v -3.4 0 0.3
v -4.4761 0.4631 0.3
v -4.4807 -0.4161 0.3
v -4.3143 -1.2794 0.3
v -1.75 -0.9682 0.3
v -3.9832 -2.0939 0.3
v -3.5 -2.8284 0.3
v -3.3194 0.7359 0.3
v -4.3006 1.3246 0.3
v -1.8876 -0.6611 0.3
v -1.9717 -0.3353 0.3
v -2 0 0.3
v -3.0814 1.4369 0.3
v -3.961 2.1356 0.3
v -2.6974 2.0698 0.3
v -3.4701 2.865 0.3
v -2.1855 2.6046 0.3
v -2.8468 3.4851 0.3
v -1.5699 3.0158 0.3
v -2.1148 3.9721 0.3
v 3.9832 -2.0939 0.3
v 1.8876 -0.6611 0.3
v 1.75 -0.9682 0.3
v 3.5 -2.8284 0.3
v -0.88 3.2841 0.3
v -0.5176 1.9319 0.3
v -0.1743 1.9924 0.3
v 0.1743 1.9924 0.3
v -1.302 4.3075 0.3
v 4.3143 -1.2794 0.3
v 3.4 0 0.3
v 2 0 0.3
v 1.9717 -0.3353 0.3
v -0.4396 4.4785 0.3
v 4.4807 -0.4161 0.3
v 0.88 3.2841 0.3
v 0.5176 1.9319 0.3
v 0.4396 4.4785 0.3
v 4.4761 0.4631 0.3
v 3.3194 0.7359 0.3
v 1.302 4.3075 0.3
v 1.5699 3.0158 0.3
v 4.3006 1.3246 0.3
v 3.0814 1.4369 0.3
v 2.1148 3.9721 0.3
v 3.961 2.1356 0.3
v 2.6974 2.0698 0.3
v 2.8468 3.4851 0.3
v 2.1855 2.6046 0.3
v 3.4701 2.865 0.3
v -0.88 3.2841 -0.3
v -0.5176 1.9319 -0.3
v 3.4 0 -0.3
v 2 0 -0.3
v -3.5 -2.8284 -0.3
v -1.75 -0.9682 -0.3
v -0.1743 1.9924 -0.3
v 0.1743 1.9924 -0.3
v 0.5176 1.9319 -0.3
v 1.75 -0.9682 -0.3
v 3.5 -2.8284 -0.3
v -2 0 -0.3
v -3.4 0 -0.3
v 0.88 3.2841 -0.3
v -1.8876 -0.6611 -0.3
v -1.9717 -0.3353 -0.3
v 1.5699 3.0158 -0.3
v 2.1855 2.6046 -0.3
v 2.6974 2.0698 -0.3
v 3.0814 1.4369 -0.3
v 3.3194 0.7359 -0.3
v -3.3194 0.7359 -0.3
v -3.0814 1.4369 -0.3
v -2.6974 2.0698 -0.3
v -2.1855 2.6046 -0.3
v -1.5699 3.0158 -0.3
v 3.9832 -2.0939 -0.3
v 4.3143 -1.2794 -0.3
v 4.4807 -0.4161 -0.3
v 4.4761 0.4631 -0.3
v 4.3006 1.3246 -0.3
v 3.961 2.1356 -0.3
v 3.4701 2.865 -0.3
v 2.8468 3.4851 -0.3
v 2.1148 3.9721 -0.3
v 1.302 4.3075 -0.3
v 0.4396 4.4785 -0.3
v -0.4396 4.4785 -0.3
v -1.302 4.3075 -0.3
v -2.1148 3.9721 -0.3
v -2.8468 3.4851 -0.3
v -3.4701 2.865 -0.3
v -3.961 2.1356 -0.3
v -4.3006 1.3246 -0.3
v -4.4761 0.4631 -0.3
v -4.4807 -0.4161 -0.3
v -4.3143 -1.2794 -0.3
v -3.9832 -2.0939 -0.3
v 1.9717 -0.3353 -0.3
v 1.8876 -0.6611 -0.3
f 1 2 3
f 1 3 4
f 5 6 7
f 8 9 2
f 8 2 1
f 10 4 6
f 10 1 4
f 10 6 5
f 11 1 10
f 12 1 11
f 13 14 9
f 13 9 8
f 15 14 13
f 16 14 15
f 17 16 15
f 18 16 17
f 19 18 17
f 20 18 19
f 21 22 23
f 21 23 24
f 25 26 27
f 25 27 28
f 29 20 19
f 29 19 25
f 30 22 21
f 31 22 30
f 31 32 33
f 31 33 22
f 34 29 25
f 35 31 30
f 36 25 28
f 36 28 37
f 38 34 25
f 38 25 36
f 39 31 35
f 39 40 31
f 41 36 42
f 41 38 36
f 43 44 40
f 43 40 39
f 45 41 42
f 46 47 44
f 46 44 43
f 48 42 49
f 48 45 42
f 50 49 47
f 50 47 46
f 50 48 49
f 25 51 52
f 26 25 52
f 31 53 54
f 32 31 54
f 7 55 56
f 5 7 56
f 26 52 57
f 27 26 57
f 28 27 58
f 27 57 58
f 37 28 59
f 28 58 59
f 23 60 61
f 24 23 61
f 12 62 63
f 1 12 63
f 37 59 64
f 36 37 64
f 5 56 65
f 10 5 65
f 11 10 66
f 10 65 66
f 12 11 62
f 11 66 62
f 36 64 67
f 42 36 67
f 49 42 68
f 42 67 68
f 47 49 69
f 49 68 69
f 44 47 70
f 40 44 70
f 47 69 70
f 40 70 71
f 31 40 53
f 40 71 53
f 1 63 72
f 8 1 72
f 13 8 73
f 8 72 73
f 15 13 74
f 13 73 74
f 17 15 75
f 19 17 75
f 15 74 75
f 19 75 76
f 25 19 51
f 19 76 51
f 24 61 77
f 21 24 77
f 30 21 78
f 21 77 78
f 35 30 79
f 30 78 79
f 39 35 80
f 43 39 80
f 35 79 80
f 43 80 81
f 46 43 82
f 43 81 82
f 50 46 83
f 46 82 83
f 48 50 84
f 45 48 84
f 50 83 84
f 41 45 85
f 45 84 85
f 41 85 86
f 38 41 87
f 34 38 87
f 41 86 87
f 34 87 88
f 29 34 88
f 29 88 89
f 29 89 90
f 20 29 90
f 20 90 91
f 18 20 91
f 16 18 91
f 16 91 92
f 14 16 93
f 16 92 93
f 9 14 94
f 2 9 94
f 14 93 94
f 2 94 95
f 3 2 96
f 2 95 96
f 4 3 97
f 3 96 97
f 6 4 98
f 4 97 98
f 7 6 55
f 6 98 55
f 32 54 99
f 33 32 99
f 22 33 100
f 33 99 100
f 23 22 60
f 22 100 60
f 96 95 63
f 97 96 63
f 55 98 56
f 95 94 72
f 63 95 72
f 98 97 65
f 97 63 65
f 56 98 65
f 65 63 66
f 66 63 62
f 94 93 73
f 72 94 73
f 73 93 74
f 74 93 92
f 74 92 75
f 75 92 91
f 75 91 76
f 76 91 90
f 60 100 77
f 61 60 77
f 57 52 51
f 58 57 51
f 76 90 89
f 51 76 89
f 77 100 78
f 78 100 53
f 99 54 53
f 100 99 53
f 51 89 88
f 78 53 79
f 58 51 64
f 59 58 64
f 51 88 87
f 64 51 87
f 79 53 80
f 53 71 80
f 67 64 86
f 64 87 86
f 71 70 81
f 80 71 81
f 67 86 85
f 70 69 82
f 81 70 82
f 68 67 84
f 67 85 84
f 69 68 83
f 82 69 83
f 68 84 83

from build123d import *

# Parameters (mm, degrees)
EXTRUDE_1_DEPTH      = 0.3
EXTRUDE_1_DEPTH_BACK = 0.3


with BuildPart() as part:
    # 草圖1 → 填料-伸長1 (new, two sides: drawn at the far end of the back side and taken through both)
    with BuildSketch(Plane.XY.offset(-EXTRUDE_1_DEPTH_BACK)):
        with BuildLine():
            Line((-3.5, -2.828427125), (-1.75, -0.968245837))
            ThreePointArc((-1.75, -0.968245837), (-1.936491673, -0.5), (-2, 0))
            Line((-2, 0), (-3.4, 0))
            ThreePointArc((-3.4, 0), (-2.697401357, 2.069788859), (-0.879984753, 3.284147809))
            Line((-0.879984753, 3.284147809), (-0.51763809, 1.931851653))
            ThreePointArc((-0.51763809, 1.931851653), (0, 2), (0.51763809, 1.931851653))
            Line((0.51763809, 1.931851653), (0.879984753, 3.284147809))
            ThreePointArc((0.879984753, 3.284147809), (2.697401357, 2.069788859), (3.4, 0))
            Line((3.4, 0), (2, 0))
            ThreePointArc((2, 0), (1.936491673, -0.5), (1.75, -0.968245837))
            Line((1.75, -0.968245837), (3.5, -2.828427125))
            ThreePointArc((3.5, -2.828427125), (0, 4.5), (-3.5, -2.828427125))
        make_face()
    extrude(amount=EXTRUDE_1_DEPTH + EXTRUDE_1_DEPTH_BACK)


solid = part.part
